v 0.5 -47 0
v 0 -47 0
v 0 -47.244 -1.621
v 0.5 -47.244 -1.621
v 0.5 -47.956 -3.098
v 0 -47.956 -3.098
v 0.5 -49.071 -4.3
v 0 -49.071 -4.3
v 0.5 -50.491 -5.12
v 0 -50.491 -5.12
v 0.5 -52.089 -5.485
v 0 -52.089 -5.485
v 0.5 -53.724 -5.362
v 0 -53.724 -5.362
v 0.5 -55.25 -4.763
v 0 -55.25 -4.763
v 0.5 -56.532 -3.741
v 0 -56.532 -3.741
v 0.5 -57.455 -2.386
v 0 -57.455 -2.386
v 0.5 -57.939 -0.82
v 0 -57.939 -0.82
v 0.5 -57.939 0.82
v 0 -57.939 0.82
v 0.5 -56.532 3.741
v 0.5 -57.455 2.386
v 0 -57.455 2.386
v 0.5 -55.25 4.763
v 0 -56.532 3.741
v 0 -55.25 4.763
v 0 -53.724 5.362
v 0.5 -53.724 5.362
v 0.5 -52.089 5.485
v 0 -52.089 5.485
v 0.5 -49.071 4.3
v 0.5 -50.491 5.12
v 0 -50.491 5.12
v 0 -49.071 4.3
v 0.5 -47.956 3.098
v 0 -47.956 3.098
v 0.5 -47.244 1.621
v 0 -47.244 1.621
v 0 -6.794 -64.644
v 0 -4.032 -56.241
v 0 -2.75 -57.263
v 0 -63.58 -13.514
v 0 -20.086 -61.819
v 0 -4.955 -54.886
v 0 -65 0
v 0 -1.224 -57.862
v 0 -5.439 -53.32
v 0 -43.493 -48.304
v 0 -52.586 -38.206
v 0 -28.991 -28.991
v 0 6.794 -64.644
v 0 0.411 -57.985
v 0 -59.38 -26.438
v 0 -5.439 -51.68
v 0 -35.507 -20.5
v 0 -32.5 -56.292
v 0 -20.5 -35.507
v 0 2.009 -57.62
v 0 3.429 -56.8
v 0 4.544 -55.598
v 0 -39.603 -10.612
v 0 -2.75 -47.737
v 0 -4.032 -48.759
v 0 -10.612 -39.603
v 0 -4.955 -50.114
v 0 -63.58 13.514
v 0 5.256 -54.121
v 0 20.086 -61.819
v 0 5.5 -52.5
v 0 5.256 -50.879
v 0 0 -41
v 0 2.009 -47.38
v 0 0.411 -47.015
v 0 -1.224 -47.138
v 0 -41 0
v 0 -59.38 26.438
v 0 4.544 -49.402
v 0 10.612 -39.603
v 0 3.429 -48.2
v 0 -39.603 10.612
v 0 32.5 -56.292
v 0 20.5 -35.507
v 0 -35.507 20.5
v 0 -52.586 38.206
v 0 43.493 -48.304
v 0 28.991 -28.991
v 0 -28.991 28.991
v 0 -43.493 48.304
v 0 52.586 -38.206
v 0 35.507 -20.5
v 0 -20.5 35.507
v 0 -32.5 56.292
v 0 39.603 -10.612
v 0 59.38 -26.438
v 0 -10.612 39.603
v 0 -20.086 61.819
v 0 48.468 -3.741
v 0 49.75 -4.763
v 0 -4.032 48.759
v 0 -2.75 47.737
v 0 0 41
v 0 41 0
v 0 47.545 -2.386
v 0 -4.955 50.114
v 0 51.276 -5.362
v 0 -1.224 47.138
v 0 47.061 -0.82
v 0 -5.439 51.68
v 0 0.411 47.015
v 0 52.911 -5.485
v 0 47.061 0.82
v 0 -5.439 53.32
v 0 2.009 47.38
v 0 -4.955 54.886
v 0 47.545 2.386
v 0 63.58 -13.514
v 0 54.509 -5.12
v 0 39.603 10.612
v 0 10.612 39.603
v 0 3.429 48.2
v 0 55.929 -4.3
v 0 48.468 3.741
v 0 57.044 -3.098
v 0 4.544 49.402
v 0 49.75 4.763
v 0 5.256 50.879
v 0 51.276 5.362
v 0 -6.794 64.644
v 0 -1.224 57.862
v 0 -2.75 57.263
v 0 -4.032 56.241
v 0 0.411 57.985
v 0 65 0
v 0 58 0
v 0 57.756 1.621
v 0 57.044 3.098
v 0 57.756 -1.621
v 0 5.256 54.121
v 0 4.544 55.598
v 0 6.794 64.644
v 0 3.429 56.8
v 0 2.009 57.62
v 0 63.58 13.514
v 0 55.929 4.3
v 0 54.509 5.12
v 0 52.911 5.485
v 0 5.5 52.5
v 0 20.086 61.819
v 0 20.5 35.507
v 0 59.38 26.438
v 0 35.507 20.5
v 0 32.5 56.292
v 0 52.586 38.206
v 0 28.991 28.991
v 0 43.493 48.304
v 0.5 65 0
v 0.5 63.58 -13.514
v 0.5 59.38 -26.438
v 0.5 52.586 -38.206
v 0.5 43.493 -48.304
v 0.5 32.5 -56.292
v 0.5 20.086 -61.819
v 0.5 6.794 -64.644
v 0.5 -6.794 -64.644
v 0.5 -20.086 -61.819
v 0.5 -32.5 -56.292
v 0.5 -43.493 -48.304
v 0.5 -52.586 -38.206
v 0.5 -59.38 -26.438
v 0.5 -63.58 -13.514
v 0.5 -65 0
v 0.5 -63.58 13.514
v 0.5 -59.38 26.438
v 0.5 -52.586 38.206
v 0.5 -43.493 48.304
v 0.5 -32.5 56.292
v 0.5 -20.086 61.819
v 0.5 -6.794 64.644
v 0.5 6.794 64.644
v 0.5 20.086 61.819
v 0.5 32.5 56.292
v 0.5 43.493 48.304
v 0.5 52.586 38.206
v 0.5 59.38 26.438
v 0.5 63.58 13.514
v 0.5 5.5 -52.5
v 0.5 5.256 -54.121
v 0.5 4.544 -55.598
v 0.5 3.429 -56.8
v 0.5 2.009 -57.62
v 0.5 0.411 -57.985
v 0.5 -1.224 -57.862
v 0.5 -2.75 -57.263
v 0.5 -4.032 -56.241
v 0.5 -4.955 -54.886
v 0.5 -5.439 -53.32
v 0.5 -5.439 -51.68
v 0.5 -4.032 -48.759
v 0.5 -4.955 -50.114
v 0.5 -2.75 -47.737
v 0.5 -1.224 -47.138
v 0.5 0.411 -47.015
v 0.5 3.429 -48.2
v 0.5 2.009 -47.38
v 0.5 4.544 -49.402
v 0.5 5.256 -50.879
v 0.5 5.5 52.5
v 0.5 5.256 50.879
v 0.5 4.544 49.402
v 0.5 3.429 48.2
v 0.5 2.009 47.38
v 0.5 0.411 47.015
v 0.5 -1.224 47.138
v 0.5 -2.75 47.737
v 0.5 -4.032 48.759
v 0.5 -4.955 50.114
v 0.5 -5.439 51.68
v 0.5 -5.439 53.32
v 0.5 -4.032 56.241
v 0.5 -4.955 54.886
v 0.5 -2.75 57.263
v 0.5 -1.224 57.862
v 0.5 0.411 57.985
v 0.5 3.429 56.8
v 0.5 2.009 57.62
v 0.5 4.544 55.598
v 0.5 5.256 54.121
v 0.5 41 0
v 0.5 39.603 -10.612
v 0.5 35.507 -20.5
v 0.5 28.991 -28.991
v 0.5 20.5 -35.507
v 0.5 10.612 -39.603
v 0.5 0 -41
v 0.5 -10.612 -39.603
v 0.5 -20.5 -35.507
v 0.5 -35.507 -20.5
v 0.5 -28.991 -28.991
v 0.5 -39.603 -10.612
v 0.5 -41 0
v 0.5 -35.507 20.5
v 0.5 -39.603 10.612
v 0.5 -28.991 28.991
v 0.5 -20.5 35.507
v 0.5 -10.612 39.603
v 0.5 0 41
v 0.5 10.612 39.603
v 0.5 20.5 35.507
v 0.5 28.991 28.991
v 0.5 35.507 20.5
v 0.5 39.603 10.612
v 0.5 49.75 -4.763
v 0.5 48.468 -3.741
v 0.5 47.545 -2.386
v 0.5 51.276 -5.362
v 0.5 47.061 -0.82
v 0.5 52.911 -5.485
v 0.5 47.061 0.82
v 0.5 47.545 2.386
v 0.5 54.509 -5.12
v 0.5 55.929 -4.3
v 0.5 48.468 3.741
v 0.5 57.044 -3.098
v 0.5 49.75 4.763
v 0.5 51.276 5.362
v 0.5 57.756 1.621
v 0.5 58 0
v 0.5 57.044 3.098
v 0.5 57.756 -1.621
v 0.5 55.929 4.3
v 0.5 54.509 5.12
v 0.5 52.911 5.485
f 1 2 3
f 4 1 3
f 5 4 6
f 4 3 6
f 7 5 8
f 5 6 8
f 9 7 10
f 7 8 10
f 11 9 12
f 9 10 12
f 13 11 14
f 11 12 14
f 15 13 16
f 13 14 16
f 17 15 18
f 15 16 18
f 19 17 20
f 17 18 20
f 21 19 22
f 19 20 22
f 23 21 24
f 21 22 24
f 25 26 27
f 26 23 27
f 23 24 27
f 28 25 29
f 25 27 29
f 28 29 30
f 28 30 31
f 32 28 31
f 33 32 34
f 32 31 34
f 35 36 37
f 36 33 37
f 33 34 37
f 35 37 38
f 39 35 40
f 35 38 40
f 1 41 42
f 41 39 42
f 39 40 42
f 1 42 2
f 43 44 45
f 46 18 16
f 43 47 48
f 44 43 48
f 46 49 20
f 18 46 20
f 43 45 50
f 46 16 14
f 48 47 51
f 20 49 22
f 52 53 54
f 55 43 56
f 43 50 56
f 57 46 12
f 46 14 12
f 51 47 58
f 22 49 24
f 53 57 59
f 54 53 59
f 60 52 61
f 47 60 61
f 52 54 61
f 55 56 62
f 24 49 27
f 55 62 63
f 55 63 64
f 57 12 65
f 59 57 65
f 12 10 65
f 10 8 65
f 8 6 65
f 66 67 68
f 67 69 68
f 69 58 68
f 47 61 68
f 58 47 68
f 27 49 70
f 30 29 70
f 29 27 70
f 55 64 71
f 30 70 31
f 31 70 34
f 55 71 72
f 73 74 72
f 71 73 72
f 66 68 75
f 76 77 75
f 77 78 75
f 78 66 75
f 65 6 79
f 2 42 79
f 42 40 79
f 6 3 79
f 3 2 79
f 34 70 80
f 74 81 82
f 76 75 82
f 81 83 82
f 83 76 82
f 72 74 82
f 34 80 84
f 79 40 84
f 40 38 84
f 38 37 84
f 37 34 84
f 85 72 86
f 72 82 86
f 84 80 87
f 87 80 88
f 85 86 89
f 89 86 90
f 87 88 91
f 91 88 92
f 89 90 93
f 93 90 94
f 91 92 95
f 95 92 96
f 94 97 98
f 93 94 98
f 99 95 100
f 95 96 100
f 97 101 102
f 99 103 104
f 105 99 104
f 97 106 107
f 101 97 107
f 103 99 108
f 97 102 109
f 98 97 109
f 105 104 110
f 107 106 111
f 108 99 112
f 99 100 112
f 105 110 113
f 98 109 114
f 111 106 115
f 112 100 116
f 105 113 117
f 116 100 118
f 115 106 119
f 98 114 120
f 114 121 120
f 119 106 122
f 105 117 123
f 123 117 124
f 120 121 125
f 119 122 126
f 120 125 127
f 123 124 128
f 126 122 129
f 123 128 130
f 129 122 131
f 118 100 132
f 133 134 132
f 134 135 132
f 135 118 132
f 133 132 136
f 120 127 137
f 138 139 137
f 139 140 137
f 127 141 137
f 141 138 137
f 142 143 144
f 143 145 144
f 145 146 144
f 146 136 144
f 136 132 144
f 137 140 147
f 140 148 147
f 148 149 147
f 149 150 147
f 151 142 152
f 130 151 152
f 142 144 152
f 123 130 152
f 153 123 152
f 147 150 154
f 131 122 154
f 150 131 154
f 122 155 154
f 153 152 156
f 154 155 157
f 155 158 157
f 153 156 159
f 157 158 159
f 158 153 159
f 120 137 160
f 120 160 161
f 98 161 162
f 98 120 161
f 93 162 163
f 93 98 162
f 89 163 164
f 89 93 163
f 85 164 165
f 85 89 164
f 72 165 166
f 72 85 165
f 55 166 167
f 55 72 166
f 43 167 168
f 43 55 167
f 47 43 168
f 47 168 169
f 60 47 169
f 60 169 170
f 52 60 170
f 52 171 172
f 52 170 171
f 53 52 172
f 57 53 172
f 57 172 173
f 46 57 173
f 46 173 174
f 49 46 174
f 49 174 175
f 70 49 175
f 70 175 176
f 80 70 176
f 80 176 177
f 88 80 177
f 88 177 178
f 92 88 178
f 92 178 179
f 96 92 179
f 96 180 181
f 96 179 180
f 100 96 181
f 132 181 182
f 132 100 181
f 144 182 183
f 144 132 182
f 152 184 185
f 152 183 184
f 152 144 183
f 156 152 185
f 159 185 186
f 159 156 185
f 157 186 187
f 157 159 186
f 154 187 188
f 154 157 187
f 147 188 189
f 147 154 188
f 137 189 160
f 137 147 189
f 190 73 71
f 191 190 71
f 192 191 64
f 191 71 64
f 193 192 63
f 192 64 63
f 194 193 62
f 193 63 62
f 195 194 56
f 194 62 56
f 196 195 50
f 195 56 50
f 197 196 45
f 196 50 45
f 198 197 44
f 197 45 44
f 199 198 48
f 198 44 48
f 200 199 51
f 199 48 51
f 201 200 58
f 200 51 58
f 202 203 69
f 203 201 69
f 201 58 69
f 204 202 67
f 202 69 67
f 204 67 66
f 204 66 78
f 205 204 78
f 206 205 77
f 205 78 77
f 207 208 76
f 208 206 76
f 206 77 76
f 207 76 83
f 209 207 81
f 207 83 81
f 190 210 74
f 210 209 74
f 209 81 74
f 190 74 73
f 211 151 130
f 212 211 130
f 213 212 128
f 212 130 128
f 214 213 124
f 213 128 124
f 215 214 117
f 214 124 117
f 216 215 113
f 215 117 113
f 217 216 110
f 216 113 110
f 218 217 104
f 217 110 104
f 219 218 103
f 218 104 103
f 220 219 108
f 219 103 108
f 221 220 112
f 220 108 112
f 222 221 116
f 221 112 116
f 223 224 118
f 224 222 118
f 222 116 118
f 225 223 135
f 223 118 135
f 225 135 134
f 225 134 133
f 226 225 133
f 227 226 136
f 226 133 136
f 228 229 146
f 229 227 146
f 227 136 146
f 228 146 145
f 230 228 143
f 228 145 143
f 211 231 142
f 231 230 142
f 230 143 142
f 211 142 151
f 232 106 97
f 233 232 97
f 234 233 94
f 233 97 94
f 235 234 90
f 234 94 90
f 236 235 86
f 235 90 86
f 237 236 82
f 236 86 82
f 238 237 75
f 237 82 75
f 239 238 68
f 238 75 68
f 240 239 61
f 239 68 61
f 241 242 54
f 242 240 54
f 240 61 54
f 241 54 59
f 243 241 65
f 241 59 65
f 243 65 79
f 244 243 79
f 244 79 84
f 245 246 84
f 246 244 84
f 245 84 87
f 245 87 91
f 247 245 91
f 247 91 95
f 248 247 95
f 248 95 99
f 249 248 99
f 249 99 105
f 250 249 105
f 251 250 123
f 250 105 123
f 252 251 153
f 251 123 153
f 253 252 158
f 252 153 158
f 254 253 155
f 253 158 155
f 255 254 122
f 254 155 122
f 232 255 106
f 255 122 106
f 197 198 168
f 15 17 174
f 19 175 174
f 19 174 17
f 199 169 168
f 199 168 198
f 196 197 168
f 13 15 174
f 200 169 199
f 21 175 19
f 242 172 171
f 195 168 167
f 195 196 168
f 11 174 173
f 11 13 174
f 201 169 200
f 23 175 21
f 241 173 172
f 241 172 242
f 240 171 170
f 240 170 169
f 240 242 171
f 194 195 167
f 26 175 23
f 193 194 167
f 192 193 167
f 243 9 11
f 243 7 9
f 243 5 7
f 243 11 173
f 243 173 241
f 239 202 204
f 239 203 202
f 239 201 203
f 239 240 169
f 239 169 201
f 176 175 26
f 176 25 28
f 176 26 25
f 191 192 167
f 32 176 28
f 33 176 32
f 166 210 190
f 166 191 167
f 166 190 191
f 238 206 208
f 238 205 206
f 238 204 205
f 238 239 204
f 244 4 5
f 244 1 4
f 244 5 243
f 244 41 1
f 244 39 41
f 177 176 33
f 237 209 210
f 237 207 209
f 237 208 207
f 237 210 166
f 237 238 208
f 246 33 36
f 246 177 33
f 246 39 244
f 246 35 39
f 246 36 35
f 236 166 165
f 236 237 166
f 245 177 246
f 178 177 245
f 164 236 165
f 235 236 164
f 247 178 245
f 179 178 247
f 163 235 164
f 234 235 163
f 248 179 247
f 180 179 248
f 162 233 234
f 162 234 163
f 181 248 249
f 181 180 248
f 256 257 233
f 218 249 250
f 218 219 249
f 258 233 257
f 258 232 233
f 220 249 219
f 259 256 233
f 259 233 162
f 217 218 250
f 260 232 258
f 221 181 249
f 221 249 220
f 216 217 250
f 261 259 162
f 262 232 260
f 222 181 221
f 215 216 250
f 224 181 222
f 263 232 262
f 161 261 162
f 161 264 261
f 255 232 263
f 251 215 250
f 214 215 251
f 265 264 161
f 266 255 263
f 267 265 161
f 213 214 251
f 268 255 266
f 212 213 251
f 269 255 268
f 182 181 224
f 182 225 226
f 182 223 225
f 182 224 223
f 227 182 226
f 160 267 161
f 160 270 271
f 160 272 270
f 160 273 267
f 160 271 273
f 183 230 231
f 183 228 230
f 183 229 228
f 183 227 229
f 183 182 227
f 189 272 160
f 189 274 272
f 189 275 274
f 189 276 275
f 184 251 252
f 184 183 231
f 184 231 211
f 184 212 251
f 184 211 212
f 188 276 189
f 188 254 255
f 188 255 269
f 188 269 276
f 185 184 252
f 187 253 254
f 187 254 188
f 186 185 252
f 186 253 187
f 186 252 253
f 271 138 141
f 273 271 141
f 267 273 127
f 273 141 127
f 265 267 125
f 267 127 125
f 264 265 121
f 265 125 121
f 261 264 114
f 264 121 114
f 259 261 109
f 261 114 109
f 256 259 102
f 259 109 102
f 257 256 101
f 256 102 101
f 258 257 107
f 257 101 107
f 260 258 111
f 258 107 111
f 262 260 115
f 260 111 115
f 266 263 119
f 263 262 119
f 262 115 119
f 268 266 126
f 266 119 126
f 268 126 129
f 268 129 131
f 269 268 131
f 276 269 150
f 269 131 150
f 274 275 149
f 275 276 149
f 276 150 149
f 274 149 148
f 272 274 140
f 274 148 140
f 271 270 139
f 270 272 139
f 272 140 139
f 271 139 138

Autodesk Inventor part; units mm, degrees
ref_plane "YZ Plane" through (0, 0, 0) normal (1, 0, 0) x (0, 1, 0)
ref_plane "XZ Plane" through (0, 0, 0) normal (0, 1, 0) x (-1, 0, 0)
ref_plane "XY Plane" through (0, 0, 0) normal (0, 0, 1) x (1, 0, 0)
sketch "草图1" plane through (0, 0, 0) normal (1, 0, 0) x (0, 1, 0)
  circle A0 centre (0, 0) radius 65
  circle A1 centre (0, 0) radius 41
  circle A2 centre (52.5, 0) radius 5.5
  circle A3 centre (0, 52.5) radius 5.5
  circle A4 centre (-52.5, 0) radius 5.5
  circle A5 centre (0, -52.5) radius 5.5
  dimension "d1" = 130
  dimension "d3" = 82
  dimension "d4" = 11
  dimension "d5" = 52.5
  dimension "d8" = 360
extrude "拉伸1" add sketch "草图1" along normal blind 0.5
equation "\"d1\" = D2"
equation "\"d3\" = d2"
equation "\"d4\" = d0"
equation "\"d5\" = 0.5 * D0"
equation "\"d10\" = b"
equation "\"b\" = 0.5"
equation "\"d0\" = 11"
equation "\"D0\" = 105"
equation "\"d2\" = 82"
equation "\"D2\" = 130"
properties part number "低速轴承调整垫片" material "铜，锻铸"
